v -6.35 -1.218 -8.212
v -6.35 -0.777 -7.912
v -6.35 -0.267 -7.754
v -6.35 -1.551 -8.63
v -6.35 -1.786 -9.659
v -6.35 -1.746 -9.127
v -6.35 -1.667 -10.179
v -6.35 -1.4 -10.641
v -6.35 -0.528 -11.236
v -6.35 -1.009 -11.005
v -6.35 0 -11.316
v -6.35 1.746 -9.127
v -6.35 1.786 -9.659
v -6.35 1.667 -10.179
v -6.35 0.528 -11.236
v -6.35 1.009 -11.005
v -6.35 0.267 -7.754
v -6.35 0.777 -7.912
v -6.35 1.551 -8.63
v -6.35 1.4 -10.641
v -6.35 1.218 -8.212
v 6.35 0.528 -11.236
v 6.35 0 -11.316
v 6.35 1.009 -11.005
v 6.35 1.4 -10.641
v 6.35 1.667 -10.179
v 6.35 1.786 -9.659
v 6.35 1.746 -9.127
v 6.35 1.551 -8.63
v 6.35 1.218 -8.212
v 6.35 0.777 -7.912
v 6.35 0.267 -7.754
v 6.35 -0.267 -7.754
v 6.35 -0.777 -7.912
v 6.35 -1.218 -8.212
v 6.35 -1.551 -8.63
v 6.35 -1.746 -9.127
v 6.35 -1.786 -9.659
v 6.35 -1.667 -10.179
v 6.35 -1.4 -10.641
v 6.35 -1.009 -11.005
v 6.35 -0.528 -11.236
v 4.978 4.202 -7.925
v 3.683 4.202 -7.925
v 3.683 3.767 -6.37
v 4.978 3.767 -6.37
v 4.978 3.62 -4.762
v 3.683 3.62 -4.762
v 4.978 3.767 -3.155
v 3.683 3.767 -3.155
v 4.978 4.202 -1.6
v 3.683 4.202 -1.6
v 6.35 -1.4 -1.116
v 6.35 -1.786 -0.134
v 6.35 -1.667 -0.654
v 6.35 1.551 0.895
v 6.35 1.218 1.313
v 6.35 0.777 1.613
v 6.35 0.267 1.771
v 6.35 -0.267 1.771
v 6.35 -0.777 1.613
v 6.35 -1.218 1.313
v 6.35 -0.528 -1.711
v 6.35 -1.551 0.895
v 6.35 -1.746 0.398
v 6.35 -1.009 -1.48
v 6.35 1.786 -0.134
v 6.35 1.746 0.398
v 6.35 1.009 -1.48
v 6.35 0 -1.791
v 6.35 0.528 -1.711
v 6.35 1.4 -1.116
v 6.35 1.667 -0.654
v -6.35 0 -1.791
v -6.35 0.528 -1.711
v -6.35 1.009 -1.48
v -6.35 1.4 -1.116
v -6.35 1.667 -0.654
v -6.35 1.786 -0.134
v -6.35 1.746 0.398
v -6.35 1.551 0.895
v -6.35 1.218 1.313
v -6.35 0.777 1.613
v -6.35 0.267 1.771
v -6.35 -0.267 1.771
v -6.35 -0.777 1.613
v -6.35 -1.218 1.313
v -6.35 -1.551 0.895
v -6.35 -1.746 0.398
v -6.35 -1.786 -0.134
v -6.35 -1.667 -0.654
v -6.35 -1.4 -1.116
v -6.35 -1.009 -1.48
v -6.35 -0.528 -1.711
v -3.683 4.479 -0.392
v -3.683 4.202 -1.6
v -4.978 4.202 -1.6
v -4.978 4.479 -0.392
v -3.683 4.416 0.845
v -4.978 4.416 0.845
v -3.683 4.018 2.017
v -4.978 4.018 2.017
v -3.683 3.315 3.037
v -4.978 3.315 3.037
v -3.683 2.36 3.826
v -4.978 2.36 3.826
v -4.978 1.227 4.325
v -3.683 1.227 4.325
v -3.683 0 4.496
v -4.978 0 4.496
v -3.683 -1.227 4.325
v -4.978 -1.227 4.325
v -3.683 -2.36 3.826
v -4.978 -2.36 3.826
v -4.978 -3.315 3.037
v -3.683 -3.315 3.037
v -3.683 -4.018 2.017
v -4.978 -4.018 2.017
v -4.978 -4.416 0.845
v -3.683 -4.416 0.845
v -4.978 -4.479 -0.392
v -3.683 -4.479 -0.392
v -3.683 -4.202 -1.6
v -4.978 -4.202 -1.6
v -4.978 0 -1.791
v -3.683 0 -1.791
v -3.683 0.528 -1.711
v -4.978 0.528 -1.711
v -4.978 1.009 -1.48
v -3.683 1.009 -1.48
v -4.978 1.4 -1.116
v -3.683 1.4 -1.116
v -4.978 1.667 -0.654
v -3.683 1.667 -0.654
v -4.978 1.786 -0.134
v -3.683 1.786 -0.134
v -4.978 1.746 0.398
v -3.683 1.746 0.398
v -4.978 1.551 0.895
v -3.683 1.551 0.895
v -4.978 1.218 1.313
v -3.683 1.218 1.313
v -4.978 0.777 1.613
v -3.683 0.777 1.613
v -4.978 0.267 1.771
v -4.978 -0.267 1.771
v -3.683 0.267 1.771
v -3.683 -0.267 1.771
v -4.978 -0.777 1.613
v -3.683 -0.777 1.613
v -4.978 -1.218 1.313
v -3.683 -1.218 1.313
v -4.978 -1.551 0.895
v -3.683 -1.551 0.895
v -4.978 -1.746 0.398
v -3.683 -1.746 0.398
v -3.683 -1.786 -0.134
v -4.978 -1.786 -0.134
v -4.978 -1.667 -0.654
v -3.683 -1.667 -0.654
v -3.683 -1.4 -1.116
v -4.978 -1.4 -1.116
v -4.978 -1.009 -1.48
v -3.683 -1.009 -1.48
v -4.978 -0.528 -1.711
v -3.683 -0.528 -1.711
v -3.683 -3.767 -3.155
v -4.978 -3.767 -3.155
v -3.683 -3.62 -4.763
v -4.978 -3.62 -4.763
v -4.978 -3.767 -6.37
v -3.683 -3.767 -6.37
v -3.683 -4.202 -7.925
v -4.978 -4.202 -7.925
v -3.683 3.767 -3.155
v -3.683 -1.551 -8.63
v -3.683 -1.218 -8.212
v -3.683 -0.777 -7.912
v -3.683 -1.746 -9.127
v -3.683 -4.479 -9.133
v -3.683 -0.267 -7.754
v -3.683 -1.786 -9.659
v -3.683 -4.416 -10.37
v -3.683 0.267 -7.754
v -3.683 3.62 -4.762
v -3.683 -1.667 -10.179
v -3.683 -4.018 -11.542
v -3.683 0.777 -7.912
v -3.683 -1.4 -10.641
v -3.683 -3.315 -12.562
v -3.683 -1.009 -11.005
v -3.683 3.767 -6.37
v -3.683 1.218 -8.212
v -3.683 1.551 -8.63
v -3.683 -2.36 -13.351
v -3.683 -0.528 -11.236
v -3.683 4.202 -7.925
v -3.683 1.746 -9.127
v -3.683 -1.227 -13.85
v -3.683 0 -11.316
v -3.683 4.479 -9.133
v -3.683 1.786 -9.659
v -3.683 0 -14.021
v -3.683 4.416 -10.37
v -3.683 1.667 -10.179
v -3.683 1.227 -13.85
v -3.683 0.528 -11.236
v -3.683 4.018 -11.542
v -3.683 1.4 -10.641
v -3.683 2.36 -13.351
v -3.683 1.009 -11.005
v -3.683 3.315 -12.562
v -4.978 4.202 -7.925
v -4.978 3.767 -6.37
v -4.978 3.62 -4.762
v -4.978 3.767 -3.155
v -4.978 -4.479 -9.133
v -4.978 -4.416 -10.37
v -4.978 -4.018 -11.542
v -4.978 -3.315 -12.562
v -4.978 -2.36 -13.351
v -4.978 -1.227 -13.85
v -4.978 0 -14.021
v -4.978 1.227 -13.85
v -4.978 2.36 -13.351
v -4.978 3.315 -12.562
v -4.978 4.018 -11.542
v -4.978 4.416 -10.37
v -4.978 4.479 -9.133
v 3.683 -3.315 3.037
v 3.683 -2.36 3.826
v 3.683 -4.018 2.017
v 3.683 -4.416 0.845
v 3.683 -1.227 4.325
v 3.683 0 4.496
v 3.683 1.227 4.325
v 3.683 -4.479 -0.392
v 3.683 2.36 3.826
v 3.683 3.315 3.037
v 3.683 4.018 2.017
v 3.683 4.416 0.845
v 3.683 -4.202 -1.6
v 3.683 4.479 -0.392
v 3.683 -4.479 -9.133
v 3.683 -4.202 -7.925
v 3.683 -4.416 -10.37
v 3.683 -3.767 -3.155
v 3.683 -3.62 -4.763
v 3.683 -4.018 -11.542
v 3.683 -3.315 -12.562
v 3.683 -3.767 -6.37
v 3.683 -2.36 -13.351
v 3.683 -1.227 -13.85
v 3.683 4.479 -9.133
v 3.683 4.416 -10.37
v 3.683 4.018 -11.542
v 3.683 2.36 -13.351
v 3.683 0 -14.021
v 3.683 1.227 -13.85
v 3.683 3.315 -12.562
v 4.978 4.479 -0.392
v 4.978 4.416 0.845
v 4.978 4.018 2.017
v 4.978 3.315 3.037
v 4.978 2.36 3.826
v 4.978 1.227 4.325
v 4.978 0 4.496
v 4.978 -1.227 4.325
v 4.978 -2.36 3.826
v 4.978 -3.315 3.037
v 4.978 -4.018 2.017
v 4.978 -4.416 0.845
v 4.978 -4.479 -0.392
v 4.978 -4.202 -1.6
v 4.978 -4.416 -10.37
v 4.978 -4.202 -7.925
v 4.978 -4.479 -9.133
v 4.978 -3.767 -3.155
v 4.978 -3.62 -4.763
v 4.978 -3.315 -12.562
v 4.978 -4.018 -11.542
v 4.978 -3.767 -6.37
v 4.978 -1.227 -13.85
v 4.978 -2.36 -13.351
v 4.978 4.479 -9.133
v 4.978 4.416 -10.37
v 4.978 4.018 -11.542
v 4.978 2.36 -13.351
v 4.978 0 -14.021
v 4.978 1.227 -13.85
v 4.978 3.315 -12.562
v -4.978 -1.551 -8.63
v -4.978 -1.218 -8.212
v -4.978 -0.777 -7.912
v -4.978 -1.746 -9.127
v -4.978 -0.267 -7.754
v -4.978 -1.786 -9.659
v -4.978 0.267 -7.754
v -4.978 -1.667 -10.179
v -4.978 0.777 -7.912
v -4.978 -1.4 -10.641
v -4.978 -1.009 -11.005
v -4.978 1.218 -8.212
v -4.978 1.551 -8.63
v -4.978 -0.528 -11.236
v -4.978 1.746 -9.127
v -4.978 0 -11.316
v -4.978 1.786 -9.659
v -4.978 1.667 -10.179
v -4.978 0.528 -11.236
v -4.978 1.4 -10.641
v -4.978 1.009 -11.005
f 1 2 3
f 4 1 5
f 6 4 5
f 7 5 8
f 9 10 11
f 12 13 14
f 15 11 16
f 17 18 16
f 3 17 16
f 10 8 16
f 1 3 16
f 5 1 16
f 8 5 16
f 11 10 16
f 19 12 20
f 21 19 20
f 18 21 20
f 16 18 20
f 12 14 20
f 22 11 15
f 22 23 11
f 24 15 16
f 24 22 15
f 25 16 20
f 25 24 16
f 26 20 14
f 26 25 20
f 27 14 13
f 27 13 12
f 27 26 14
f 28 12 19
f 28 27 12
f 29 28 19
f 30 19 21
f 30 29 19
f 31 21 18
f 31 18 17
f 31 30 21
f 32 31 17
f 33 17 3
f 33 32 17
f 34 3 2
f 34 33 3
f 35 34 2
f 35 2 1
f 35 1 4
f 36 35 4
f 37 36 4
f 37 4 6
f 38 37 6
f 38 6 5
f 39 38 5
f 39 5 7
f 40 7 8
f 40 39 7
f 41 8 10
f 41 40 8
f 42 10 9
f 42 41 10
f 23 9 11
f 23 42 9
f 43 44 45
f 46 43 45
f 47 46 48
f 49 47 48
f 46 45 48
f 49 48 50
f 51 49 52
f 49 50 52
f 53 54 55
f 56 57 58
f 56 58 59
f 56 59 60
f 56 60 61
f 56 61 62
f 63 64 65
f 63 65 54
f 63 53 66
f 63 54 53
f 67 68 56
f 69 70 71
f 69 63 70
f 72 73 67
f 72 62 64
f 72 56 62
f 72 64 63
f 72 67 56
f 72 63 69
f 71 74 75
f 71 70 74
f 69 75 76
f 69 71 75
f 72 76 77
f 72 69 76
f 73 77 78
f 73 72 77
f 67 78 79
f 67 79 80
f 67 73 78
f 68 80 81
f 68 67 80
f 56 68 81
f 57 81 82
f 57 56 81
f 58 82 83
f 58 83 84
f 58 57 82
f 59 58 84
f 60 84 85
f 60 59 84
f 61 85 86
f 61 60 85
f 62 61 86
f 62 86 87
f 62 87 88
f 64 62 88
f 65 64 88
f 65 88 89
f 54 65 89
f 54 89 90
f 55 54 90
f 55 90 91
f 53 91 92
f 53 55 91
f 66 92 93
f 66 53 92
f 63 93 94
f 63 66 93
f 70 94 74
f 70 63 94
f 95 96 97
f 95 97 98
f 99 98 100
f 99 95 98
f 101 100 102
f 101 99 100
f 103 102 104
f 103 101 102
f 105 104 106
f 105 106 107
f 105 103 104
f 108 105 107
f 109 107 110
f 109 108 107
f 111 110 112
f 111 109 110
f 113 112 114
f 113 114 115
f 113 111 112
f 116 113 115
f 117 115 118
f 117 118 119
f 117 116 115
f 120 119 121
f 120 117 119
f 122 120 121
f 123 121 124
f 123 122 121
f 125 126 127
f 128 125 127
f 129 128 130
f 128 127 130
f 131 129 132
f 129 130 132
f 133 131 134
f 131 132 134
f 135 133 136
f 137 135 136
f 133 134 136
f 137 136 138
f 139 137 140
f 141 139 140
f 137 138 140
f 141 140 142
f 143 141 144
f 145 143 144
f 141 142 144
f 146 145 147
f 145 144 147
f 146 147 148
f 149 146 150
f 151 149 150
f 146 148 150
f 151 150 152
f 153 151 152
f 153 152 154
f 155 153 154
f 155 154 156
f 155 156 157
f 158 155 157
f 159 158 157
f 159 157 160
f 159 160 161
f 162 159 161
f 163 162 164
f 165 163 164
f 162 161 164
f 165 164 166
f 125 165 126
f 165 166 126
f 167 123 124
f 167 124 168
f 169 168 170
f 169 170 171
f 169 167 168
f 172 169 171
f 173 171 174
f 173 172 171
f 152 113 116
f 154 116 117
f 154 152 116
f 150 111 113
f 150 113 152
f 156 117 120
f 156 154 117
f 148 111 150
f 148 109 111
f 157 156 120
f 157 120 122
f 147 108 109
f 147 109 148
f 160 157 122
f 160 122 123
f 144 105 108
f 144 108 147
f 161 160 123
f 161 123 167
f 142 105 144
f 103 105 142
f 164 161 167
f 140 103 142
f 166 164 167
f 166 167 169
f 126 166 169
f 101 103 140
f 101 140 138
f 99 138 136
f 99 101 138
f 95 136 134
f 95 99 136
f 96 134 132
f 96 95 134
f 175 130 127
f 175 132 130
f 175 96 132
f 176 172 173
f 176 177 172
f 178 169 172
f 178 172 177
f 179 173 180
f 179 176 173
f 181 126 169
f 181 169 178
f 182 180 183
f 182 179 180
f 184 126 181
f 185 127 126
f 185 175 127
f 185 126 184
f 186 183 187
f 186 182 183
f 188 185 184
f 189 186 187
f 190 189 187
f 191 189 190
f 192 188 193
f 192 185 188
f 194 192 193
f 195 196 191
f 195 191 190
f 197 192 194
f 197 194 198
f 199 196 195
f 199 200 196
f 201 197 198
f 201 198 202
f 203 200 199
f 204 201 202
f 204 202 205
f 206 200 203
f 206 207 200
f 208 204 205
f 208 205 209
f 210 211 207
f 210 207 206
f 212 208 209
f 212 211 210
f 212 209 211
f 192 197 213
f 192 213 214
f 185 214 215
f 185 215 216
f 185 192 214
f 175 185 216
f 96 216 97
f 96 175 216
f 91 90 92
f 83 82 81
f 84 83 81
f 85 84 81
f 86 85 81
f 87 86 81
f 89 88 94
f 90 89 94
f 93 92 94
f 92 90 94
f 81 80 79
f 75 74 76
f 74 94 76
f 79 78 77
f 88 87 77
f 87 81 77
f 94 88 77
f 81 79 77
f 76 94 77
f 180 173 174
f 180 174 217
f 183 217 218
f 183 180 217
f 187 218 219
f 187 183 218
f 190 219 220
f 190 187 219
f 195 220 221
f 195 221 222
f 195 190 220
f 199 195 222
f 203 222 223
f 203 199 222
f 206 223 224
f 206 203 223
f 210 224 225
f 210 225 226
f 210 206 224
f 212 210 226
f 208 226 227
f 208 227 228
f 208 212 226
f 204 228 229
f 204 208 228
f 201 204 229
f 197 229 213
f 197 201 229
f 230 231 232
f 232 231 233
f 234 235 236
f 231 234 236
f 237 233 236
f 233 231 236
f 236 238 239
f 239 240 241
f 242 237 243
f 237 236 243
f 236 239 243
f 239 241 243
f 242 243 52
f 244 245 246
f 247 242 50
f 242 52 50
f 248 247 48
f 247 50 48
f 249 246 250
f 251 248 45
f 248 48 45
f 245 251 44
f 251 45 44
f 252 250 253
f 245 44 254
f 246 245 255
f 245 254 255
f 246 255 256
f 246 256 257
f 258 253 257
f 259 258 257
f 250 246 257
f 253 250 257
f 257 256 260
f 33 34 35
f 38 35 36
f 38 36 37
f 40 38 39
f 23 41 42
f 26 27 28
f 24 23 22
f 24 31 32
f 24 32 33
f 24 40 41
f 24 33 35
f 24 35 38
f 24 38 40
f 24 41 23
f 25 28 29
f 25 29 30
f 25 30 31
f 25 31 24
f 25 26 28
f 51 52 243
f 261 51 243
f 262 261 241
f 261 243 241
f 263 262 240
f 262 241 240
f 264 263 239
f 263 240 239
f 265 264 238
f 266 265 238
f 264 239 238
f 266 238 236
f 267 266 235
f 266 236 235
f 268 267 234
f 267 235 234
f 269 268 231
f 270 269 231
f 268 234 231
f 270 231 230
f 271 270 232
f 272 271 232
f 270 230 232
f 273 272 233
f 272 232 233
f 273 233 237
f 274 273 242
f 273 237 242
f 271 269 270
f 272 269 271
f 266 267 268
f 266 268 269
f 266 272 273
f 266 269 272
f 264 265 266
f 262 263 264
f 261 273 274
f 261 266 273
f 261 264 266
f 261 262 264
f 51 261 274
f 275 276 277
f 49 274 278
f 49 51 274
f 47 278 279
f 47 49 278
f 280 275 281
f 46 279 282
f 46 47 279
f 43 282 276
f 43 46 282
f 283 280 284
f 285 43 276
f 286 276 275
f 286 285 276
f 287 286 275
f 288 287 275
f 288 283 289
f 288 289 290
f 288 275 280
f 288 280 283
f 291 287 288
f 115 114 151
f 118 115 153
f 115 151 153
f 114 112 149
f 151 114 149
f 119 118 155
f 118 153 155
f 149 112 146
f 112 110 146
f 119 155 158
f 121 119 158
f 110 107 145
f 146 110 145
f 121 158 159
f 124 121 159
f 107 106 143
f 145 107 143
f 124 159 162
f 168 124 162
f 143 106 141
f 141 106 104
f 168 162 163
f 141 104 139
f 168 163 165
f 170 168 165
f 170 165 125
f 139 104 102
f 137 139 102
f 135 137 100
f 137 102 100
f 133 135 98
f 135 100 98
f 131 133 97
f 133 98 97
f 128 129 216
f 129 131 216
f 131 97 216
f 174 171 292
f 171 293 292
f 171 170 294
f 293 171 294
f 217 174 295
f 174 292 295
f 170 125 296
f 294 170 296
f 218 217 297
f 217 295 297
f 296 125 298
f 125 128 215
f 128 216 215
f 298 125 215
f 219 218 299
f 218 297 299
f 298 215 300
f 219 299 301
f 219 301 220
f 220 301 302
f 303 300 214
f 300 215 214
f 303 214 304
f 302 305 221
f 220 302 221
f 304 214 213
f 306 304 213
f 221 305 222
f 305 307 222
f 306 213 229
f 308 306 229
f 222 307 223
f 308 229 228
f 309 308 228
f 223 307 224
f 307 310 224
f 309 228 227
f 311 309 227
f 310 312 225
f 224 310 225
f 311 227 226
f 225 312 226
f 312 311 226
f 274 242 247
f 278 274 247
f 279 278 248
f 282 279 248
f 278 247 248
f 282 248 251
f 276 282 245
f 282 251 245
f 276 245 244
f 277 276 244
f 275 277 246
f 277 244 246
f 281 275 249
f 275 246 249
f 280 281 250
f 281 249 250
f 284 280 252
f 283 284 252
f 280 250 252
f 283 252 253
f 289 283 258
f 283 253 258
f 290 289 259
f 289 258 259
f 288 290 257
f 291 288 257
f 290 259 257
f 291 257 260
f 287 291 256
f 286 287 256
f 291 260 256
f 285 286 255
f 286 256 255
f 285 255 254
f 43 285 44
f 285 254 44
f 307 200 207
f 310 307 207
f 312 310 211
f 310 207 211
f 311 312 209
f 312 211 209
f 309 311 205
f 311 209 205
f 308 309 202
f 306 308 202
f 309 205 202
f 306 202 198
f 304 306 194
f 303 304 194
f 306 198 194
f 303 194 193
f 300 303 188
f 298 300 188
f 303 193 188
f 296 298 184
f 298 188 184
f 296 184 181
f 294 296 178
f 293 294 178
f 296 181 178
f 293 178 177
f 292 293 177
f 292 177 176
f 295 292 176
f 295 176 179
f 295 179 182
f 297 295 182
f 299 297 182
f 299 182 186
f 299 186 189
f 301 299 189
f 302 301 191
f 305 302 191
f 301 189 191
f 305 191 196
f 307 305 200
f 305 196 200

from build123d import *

# Parameters (mm, degrees)
SKETCH1_R             = 1.7907
BOSS_EXTRUDE1_DEPTH   = 6.35
BOSS_EXTRUDE1_2_DEPTH = 6.35
BOSS_EXTRUDE2_START   = 3.683
BOSS_EXTRUDE2_DEPTH   = 1.2954
BOSS_EXTRUDE3_START   = -3.683
SKETCH1_5_R           = 1.7907
BOSS_EXTRUDE3_DEPTH   = 1.2954


with BuildPart() as part:
    # Sketch1 → Boss-Extrude1 (new, symmetric)
    with BuildSketch(Plane(origin=(0, 0, 0), x_dir=(0, 0, -1), z_dir=(1, 0, 0))):
        with Locations((9.525, 0)):
            Circle(SKETCH1_R)
    extrude(amount=BOSS_EXTRUDE1_DEPTH, both=True)


with BuildPart() as body_2:
    # Sketch1 → Boss-Extrude1 2 (new, symmetric)
    with BuildSketch(Plane(origin=(0, 0, 0), x_dir=(0, 0, -1), z_dir=(1, 0, 0))):
        Circle(SKETCH1_R)
    extrude(amount=BOSS_EXTRUDE1_2_DEPTH, both=True)


with BuildPart() as body_3:
    # Sketch1<4> → Boss-Extrude2 (new body)
    with BuildSketch(Plane(origin=(0, 0, 0), x_dir=(0, 0, -1), z_dir=(1, 0, 0)).offset(BOSS_EXTRUDE2_START)):
        with BuildLine():
            ThreePointArc((1.599549336, 4.201625824), (-4.4958, 0), (1.599549336, -4.201625824))
            ThreePointArc((1.599549336, -4.201625824), (4.7625, -3.619925475), (7.925450664, -4.201625824))
            ThreePointArc((7.925450664, -4.201625824), (14.0208, 0), (7.925450664, 4.201625824))
            ThreePointArc((7.925450664, 4.201625824), (4.7625, 3.619925475), (1.599549336, 4.201625824))
        make_face()
    extrude(amount=BOSS_EXTRUDE2_DEPTH)


with BuildPart() as body_4:
    # Sketch1<5> → Boss-Extrude3 (new body)
    with BuildSketch(Plane(origin=(0, 0, 0), x_dir=(0, 0, -1), z_dir=(1, 0, 0)).offset(BOSS_EXTRUDE3_START)):
        with BuildLine():
            ThreePointArc((1.599549336, 4.201625824), (-4.4958, 0), (1.599549336, -4.201625824))
            ThreePointArc((1.599549336, -4.201625824), (4.7625, -3.619925475), (7.925450664, -4.201625824))
            ThreePointArc((7.925450664, -4.201625824), (14.0208, 0), (7.925450664, 4.201625824))
            ThreePointArc((7.925450664, 4.201625824), (4.7625, 3.619925475), (1.599549336, 4.201625824))
        make_face()
        with Locations((9.525, 0)):
            Circle(SKETCH1_5_R, mode=Mode.SUBTRACT)
        Circle(SKETCH1_5_R, mode=Mode.SUBTRACT)
    extrude(amount=-BOSS_EXTRUDE3_DEPTH)


solid = Compound([part.part, body_2.part, body_3.part, body_4.part])
